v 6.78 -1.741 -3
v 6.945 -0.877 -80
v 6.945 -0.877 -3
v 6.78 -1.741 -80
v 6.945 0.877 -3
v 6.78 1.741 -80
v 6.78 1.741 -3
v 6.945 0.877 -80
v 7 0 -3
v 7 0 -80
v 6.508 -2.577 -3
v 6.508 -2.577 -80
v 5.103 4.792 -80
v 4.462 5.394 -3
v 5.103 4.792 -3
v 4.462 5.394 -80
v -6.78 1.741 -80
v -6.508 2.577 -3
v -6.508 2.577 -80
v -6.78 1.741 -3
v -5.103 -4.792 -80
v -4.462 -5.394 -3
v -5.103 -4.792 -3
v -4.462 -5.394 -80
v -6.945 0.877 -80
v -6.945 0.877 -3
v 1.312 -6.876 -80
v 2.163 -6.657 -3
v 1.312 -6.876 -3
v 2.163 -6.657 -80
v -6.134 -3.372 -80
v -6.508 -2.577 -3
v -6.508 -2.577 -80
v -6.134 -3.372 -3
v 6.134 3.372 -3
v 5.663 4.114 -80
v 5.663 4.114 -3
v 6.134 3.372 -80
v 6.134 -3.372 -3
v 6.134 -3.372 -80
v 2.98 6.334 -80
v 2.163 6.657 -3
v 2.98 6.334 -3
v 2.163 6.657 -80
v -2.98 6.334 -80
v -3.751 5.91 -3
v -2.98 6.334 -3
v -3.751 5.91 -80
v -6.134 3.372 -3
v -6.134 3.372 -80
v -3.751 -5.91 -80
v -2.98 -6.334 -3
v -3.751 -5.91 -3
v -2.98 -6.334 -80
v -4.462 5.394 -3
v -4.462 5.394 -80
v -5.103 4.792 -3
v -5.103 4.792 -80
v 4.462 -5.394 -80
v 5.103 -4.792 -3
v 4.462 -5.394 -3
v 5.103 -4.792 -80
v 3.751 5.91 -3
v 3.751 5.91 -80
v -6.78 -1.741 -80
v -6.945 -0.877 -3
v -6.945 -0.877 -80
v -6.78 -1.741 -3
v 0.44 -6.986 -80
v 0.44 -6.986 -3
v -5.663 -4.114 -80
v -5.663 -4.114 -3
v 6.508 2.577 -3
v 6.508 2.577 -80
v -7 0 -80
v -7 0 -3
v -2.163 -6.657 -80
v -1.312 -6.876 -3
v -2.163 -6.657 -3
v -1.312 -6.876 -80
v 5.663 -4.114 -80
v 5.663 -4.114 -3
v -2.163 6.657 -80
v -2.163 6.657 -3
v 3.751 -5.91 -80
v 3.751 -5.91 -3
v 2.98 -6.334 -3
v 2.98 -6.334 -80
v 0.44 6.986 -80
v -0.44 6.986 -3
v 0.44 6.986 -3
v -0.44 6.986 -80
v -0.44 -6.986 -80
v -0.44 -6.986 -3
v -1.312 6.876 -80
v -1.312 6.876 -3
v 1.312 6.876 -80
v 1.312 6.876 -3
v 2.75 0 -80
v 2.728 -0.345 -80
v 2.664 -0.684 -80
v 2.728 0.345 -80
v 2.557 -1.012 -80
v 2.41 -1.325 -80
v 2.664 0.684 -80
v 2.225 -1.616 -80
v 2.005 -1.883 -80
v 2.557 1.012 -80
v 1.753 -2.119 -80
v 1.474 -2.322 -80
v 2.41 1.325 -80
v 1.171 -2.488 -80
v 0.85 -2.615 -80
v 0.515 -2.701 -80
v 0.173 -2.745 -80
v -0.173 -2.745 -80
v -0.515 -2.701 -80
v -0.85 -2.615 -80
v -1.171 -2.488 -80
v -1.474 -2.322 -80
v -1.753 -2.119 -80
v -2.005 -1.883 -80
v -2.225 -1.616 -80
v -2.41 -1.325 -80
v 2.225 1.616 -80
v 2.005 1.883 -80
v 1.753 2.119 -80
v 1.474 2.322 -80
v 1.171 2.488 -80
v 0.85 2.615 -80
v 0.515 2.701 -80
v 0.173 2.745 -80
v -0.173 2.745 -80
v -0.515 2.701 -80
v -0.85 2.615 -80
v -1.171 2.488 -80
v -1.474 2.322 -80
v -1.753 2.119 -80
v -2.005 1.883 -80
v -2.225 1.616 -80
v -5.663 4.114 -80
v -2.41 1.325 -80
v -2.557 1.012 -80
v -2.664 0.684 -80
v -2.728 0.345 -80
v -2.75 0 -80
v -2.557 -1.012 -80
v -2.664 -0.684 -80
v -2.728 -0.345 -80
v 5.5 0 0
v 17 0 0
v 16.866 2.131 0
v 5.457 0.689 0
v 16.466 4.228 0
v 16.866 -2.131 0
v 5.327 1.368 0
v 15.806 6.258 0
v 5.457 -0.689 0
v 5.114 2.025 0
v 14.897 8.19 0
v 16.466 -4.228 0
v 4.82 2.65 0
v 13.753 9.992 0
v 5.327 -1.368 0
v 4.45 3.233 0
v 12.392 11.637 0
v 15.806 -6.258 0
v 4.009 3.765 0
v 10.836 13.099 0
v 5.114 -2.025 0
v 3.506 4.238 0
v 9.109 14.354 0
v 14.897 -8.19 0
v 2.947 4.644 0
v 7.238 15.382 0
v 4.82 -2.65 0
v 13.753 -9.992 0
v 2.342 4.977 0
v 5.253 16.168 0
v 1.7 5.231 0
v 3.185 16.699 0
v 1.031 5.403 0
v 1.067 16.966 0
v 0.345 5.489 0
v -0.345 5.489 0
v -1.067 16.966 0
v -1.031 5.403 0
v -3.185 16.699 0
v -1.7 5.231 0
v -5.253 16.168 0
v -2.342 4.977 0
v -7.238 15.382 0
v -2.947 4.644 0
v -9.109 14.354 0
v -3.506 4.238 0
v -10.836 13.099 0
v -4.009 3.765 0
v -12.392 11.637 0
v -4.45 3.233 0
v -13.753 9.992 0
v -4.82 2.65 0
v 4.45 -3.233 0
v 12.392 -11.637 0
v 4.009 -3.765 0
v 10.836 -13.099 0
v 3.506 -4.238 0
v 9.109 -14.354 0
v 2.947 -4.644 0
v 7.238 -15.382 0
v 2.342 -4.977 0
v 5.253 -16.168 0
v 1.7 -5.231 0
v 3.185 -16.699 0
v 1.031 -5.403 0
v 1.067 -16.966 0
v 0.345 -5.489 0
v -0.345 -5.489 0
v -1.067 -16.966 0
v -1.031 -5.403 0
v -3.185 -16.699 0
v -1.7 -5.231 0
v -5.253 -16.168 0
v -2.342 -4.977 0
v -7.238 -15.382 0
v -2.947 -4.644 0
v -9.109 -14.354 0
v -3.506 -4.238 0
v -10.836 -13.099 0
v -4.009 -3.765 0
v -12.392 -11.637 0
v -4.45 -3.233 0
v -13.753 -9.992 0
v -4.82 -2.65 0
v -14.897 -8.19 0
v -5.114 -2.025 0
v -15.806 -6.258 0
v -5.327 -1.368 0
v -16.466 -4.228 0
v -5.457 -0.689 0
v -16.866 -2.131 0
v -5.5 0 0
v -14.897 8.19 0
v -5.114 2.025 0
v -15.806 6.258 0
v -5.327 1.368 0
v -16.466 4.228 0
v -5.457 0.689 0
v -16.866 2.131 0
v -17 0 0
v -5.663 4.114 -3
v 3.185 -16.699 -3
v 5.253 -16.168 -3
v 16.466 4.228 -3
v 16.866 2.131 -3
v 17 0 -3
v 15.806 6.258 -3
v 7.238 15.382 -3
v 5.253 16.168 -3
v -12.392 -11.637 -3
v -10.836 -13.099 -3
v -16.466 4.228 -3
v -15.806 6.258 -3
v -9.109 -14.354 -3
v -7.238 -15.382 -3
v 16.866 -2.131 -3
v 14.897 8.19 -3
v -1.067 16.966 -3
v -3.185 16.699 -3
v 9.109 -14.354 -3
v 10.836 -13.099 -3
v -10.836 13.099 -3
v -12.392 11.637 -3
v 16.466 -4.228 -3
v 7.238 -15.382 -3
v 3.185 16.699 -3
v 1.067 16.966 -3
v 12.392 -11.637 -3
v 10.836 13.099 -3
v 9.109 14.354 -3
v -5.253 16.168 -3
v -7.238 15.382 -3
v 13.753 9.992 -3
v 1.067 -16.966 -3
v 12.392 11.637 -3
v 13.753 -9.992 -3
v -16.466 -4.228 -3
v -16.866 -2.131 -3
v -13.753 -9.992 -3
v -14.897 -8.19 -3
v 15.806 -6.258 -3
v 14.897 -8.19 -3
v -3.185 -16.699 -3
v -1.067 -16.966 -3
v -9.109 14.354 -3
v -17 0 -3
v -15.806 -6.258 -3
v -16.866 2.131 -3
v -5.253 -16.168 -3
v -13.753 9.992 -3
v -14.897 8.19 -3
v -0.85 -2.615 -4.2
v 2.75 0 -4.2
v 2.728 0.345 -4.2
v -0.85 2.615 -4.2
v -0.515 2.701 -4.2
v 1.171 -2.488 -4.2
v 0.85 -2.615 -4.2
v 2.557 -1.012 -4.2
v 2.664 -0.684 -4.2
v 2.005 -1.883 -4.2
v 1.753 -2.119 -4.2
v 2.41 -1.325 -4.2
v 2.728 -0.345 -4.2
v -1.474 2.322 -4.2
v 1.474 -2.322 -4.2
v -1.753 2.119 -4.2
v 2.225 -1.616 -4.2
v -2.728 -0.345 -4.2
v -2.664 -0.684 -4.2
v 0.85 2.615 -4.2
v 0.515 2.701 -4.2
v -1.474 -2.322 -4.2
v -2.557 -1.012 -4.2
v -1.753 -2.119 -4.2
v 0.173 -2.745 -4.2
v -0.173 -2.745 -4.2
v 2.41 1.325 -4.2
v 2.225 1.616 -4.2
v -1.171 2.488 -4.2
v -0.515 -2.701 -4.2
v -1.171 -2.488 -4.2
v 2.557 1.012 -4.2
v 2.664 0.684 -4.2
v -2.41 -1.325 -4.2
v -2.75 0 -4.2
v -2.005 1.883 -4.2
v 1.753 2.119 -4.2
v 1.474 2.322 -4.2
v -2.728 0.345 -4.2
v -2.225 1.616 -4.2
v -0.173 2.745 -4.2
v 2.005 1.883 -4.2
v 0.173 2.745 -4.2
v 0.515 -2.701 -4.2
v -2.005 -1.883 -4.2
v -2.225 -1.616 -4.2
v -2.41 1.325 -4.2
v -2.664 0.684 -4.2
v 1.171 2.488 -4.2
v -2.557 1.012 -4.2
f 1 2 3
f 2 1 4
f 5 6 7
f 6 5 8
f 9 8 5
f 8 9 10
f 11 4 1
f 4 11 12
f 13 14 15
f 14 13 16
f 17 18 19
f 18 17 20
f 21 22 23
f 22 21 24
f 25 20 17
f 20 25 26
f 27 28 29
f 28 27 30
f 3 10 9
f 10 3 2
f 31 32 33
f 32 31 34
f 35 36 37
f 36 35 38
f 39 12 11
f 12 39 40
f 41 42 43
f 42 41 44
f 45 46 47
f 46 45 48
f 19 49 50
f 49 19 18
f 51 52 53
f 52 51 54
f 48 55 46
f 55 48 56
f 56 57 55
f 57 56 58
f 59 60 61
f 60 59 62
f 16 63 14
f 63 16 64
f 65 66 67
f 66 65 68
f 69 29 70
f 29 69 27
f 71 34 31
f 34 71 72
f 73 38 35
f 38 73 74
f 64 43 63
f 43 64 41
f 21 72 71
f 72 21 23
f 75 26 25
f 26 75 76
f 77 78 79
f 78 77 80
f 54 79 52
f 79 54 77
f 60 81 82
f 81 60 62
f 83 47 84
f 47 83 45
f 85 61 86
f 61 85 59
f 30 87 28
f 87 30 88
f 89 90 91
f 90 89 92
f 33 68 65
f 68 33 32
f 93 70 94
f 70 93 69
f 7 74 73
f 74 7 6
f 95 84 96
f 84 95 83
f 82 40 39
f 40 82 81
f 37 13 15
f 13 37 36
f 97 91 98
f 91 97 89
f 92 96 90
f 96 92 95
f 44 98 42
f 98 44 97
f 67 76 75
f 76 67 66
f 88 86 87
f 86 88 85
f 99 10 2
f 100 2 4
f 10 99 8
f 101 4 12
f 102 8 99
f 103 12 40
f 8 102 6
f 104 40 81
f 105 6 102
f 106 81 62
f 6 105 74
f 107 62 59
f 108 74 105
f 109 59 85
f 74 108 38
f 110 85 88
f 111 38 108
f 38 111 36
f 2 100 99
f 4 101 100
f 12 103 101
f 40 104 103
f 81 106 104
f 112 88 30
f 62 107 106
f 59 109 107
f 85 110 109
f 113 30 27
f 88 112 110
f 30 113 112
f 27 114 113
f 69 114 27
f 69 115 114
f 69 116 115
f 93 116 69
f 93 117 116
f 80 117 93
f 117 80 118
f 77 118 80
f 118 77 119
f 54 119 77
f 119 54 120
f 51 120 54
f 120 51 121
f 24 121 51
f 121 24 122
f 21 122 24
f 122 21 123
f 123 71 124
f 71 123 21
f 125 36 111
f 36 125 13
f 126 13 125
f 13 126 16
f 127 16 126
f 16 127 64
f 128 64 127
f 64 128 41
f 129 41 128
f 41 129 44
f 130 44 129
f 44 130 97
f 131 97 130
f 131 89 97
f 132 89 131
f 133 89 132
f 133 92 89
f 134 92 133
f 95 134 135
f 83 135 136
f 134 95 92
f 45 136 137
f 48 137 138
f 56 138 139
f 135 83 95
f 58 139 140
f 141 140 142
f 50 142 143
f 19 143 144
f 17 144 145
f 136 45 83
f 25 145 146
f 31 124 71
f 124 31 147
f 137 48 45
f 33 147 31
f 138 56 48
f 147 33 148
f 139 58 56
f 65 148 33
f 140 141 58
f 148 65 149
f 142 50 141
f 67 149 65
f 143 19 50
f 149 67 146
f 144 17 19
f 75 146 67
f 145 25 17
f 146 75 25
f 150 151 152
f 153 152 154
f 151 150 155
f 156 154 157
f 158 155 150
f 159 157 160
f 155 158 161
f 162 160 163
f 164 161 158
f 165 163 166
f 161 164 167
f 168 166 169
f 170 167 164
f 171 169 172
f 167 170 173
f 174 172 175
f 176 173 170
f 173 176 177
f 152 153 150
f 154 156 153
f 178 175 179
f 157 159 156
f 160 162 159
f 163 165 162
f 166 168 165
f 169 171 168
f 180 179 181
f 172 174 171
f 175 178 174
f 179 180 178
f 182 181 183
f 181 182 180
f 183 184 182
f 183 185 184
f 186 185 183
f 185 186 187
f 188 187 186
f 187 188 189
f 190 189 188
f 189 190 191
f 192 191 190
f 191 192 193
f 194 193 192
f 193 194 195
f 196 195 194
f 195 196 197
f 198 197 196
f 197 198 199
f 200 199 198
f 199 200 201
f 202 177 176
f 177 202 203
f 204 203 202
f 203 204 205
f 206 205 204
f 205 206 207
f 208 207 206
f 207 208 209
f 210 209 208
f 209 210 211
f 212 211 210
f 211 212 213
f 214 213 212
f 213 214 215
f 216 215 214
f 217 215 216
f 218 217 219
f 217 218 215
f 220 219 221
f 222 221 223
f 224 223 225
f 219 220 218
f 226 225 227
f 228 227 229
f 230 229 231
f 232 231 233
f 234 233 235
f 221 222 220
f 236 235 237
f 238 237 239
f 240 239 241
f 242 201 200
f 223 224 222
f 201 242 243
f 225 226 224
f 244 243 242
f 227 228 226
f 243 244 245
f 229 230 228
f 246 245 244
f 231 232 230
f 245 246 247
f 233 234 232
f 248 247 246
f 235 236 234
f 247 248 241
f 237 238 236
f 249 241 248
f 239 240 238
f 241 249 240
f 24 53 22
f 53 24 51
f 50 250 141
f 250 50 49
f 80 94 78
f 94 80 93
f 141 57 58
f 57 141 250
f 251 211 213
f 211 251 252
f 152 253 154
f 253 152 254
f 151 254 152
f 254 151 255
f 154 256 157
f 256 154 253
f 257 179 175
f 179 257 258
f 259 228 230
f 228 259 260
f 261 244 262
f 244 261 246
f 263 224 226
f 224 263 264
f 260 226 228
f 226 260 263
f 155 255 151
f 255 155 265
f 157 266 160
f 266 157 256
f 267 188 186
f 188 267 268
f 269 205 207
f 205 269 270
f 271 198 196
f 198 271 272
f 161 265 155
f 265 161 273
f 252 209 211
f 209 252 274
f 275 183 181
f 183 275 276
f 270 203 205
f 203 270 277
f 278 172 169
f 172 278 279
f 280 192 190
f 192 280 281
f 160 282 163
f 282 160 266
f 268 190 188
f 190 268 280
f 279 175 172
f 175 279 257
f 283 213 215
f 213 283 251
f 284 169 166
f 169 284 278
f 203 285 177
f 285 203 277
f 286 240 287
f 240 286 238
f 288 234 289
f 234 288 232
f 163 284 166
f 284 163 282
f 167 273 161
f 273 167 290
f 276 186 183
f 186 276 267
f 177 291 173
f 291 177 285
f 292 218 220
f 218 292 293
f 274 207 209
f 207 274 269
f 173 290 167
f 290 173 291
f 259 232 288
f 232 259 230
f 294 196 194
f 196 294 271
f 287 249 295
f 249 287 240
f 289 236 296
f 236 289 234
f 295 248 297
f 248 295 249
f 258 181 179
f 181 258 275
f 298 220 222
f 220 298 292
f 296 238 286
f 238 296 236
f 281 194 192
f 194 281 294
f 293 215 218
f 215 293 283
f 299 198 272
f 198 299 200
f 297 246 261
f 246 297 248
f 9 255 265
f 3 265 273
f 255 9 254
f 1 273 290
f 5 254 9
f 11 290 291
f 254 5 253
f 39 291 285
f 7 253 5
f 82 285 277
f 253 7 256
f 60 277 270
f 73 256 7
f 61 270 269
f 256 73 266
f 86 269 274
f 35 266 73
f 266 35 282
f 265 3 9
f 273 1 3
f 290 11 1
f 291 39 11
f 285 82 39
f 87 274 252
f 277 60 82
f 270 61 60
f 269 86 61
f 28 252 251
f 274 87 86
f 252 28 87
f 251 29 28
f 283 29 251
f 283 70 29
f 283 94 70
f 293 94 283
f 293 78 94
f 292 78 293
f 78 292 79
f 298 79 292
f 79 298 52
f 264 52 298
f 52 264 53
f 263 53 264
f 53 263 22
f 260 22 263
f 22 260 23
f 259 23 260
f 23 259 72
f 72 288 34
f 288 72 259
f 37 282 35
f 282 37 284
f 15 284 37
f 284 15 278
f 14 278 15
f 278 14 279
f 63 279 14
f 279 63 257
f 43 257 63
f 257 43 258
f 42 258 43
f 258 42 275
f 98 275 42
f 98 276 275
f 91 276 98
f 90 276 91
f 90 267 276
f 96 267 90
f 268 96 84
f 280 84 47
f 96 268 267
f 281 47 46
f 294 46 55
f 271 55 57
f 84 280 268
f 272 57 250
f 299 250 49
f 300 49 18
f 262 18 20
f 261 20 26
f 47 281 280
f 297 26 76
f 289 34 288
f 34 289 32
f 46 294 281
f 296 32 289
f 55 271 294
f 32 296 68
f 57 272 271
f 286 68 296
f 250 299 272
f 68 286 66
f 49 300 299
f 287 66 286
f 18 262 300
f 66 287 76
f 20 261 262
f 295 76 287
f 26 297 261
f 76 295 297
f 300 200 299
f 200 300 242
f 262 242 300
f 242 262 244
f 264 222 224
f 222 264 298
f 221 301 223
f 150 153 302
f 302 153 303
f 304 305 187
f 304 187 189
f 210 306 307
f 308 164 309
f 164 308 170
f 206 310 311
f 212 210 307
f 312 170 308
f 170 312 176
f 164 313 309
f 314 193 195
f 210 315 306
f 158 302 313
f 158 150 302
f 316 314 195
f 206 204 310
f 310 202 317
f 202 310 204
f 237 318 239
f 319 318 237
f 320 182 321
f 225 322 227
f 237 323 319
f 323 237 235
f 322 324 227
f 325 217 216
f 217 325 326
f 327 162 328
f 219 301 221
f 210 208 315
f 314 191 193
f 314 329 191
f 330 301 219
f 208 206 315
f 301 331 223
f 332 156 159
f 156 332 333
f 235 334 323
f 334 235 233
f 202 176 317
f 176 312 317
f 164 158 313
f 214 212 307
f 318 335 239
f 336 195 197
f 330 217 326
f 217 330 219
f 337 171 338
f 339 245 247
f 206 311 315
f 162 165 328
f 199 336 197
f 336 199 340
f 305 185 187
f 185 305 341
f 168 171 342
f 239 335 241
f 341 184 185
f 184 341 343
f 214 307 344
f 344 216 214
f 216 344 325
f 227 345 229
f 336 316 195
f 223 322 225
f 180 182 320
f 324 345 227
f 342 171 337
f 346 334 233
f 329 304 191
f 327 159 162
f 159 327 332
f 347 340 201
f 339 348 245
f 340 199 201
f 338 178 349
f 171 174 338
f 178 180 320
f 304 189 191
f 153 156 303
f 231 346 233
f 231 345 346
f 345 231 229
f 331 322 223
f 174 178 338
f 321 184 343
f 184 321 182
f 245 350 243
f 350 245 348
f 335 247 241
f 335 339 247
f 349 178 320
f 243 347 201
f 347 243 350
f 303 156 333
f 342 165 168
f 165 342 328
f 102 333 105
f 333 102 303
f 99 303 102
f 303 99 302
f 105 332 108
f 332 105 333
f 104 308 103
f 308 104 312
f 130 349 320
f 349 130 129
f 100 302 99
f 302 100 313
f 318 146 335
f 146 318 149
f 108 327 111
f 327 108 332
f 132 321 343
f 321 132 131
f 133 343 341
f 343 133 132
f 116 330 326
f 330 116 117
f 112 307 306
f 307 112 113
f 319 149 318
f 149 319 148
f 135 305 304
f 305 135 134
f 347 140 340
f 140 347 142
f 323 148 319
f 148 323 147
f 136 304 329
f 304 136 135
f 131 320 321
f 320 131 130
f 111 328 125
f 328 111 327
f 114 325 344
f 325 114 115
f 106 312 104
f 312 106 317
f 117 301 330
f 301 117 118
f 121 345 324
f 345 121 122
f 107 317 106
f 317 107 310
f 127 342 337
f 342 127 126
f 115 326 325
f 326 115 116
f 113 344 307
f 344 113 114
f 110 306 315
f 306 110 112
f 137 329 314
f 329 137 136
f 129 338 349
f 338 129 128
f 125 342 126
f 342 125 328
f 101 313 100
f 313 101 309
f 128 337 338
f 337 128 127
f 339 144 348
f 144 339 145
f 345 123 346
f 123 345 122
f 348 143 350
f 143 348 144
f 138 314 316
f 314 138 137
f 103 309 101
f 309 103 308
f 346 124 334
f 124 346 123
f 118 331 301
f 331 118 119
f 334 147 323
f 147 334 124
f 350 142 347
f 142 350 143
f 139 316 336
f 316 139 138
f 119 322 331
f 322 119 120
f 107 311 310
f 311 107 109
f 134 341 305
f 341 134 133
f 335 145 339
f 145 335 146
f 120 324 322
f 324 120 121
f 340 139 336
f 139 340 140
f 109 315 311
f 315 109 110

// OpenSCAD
$fn = 50;


difference() {
	union() {
		translate(v = [0, 0, -80.0000000000]) {
			cylinder(h = 80, r = 7.0000000000);
		}
		translate(v = [0, 0, -3.0000000000]) {
			cylinder(h = 3, r = 17.0000000000);
		}
	}
	union() {
		translate(v = [0, 0, 0]) {
			rotate(a = [0, 0, 0]) {
				difference() {
					union() {
						#translate(v = [0, 0, -80.0000000000]) {
							cylinder(h = 80, r = 2.2500000000);
						}
						#translate(v = [0, 0, -4.2000000000]) {
							cylinder(h = 4.2000000000, r1 = 2.7500000000, r2 = 5.5000000000);
						}
						#translate(v = [0, 0, -80.0000000000]) {
							cylinder(h = 80, r = 2.7500000000);
						}
						#translate(v = [0, 0, -80.0000000000]) {
							cylinder(h = 80, r = 2.2500000000);
						}
					}
					union();
				}
			}
		}
	}
}
